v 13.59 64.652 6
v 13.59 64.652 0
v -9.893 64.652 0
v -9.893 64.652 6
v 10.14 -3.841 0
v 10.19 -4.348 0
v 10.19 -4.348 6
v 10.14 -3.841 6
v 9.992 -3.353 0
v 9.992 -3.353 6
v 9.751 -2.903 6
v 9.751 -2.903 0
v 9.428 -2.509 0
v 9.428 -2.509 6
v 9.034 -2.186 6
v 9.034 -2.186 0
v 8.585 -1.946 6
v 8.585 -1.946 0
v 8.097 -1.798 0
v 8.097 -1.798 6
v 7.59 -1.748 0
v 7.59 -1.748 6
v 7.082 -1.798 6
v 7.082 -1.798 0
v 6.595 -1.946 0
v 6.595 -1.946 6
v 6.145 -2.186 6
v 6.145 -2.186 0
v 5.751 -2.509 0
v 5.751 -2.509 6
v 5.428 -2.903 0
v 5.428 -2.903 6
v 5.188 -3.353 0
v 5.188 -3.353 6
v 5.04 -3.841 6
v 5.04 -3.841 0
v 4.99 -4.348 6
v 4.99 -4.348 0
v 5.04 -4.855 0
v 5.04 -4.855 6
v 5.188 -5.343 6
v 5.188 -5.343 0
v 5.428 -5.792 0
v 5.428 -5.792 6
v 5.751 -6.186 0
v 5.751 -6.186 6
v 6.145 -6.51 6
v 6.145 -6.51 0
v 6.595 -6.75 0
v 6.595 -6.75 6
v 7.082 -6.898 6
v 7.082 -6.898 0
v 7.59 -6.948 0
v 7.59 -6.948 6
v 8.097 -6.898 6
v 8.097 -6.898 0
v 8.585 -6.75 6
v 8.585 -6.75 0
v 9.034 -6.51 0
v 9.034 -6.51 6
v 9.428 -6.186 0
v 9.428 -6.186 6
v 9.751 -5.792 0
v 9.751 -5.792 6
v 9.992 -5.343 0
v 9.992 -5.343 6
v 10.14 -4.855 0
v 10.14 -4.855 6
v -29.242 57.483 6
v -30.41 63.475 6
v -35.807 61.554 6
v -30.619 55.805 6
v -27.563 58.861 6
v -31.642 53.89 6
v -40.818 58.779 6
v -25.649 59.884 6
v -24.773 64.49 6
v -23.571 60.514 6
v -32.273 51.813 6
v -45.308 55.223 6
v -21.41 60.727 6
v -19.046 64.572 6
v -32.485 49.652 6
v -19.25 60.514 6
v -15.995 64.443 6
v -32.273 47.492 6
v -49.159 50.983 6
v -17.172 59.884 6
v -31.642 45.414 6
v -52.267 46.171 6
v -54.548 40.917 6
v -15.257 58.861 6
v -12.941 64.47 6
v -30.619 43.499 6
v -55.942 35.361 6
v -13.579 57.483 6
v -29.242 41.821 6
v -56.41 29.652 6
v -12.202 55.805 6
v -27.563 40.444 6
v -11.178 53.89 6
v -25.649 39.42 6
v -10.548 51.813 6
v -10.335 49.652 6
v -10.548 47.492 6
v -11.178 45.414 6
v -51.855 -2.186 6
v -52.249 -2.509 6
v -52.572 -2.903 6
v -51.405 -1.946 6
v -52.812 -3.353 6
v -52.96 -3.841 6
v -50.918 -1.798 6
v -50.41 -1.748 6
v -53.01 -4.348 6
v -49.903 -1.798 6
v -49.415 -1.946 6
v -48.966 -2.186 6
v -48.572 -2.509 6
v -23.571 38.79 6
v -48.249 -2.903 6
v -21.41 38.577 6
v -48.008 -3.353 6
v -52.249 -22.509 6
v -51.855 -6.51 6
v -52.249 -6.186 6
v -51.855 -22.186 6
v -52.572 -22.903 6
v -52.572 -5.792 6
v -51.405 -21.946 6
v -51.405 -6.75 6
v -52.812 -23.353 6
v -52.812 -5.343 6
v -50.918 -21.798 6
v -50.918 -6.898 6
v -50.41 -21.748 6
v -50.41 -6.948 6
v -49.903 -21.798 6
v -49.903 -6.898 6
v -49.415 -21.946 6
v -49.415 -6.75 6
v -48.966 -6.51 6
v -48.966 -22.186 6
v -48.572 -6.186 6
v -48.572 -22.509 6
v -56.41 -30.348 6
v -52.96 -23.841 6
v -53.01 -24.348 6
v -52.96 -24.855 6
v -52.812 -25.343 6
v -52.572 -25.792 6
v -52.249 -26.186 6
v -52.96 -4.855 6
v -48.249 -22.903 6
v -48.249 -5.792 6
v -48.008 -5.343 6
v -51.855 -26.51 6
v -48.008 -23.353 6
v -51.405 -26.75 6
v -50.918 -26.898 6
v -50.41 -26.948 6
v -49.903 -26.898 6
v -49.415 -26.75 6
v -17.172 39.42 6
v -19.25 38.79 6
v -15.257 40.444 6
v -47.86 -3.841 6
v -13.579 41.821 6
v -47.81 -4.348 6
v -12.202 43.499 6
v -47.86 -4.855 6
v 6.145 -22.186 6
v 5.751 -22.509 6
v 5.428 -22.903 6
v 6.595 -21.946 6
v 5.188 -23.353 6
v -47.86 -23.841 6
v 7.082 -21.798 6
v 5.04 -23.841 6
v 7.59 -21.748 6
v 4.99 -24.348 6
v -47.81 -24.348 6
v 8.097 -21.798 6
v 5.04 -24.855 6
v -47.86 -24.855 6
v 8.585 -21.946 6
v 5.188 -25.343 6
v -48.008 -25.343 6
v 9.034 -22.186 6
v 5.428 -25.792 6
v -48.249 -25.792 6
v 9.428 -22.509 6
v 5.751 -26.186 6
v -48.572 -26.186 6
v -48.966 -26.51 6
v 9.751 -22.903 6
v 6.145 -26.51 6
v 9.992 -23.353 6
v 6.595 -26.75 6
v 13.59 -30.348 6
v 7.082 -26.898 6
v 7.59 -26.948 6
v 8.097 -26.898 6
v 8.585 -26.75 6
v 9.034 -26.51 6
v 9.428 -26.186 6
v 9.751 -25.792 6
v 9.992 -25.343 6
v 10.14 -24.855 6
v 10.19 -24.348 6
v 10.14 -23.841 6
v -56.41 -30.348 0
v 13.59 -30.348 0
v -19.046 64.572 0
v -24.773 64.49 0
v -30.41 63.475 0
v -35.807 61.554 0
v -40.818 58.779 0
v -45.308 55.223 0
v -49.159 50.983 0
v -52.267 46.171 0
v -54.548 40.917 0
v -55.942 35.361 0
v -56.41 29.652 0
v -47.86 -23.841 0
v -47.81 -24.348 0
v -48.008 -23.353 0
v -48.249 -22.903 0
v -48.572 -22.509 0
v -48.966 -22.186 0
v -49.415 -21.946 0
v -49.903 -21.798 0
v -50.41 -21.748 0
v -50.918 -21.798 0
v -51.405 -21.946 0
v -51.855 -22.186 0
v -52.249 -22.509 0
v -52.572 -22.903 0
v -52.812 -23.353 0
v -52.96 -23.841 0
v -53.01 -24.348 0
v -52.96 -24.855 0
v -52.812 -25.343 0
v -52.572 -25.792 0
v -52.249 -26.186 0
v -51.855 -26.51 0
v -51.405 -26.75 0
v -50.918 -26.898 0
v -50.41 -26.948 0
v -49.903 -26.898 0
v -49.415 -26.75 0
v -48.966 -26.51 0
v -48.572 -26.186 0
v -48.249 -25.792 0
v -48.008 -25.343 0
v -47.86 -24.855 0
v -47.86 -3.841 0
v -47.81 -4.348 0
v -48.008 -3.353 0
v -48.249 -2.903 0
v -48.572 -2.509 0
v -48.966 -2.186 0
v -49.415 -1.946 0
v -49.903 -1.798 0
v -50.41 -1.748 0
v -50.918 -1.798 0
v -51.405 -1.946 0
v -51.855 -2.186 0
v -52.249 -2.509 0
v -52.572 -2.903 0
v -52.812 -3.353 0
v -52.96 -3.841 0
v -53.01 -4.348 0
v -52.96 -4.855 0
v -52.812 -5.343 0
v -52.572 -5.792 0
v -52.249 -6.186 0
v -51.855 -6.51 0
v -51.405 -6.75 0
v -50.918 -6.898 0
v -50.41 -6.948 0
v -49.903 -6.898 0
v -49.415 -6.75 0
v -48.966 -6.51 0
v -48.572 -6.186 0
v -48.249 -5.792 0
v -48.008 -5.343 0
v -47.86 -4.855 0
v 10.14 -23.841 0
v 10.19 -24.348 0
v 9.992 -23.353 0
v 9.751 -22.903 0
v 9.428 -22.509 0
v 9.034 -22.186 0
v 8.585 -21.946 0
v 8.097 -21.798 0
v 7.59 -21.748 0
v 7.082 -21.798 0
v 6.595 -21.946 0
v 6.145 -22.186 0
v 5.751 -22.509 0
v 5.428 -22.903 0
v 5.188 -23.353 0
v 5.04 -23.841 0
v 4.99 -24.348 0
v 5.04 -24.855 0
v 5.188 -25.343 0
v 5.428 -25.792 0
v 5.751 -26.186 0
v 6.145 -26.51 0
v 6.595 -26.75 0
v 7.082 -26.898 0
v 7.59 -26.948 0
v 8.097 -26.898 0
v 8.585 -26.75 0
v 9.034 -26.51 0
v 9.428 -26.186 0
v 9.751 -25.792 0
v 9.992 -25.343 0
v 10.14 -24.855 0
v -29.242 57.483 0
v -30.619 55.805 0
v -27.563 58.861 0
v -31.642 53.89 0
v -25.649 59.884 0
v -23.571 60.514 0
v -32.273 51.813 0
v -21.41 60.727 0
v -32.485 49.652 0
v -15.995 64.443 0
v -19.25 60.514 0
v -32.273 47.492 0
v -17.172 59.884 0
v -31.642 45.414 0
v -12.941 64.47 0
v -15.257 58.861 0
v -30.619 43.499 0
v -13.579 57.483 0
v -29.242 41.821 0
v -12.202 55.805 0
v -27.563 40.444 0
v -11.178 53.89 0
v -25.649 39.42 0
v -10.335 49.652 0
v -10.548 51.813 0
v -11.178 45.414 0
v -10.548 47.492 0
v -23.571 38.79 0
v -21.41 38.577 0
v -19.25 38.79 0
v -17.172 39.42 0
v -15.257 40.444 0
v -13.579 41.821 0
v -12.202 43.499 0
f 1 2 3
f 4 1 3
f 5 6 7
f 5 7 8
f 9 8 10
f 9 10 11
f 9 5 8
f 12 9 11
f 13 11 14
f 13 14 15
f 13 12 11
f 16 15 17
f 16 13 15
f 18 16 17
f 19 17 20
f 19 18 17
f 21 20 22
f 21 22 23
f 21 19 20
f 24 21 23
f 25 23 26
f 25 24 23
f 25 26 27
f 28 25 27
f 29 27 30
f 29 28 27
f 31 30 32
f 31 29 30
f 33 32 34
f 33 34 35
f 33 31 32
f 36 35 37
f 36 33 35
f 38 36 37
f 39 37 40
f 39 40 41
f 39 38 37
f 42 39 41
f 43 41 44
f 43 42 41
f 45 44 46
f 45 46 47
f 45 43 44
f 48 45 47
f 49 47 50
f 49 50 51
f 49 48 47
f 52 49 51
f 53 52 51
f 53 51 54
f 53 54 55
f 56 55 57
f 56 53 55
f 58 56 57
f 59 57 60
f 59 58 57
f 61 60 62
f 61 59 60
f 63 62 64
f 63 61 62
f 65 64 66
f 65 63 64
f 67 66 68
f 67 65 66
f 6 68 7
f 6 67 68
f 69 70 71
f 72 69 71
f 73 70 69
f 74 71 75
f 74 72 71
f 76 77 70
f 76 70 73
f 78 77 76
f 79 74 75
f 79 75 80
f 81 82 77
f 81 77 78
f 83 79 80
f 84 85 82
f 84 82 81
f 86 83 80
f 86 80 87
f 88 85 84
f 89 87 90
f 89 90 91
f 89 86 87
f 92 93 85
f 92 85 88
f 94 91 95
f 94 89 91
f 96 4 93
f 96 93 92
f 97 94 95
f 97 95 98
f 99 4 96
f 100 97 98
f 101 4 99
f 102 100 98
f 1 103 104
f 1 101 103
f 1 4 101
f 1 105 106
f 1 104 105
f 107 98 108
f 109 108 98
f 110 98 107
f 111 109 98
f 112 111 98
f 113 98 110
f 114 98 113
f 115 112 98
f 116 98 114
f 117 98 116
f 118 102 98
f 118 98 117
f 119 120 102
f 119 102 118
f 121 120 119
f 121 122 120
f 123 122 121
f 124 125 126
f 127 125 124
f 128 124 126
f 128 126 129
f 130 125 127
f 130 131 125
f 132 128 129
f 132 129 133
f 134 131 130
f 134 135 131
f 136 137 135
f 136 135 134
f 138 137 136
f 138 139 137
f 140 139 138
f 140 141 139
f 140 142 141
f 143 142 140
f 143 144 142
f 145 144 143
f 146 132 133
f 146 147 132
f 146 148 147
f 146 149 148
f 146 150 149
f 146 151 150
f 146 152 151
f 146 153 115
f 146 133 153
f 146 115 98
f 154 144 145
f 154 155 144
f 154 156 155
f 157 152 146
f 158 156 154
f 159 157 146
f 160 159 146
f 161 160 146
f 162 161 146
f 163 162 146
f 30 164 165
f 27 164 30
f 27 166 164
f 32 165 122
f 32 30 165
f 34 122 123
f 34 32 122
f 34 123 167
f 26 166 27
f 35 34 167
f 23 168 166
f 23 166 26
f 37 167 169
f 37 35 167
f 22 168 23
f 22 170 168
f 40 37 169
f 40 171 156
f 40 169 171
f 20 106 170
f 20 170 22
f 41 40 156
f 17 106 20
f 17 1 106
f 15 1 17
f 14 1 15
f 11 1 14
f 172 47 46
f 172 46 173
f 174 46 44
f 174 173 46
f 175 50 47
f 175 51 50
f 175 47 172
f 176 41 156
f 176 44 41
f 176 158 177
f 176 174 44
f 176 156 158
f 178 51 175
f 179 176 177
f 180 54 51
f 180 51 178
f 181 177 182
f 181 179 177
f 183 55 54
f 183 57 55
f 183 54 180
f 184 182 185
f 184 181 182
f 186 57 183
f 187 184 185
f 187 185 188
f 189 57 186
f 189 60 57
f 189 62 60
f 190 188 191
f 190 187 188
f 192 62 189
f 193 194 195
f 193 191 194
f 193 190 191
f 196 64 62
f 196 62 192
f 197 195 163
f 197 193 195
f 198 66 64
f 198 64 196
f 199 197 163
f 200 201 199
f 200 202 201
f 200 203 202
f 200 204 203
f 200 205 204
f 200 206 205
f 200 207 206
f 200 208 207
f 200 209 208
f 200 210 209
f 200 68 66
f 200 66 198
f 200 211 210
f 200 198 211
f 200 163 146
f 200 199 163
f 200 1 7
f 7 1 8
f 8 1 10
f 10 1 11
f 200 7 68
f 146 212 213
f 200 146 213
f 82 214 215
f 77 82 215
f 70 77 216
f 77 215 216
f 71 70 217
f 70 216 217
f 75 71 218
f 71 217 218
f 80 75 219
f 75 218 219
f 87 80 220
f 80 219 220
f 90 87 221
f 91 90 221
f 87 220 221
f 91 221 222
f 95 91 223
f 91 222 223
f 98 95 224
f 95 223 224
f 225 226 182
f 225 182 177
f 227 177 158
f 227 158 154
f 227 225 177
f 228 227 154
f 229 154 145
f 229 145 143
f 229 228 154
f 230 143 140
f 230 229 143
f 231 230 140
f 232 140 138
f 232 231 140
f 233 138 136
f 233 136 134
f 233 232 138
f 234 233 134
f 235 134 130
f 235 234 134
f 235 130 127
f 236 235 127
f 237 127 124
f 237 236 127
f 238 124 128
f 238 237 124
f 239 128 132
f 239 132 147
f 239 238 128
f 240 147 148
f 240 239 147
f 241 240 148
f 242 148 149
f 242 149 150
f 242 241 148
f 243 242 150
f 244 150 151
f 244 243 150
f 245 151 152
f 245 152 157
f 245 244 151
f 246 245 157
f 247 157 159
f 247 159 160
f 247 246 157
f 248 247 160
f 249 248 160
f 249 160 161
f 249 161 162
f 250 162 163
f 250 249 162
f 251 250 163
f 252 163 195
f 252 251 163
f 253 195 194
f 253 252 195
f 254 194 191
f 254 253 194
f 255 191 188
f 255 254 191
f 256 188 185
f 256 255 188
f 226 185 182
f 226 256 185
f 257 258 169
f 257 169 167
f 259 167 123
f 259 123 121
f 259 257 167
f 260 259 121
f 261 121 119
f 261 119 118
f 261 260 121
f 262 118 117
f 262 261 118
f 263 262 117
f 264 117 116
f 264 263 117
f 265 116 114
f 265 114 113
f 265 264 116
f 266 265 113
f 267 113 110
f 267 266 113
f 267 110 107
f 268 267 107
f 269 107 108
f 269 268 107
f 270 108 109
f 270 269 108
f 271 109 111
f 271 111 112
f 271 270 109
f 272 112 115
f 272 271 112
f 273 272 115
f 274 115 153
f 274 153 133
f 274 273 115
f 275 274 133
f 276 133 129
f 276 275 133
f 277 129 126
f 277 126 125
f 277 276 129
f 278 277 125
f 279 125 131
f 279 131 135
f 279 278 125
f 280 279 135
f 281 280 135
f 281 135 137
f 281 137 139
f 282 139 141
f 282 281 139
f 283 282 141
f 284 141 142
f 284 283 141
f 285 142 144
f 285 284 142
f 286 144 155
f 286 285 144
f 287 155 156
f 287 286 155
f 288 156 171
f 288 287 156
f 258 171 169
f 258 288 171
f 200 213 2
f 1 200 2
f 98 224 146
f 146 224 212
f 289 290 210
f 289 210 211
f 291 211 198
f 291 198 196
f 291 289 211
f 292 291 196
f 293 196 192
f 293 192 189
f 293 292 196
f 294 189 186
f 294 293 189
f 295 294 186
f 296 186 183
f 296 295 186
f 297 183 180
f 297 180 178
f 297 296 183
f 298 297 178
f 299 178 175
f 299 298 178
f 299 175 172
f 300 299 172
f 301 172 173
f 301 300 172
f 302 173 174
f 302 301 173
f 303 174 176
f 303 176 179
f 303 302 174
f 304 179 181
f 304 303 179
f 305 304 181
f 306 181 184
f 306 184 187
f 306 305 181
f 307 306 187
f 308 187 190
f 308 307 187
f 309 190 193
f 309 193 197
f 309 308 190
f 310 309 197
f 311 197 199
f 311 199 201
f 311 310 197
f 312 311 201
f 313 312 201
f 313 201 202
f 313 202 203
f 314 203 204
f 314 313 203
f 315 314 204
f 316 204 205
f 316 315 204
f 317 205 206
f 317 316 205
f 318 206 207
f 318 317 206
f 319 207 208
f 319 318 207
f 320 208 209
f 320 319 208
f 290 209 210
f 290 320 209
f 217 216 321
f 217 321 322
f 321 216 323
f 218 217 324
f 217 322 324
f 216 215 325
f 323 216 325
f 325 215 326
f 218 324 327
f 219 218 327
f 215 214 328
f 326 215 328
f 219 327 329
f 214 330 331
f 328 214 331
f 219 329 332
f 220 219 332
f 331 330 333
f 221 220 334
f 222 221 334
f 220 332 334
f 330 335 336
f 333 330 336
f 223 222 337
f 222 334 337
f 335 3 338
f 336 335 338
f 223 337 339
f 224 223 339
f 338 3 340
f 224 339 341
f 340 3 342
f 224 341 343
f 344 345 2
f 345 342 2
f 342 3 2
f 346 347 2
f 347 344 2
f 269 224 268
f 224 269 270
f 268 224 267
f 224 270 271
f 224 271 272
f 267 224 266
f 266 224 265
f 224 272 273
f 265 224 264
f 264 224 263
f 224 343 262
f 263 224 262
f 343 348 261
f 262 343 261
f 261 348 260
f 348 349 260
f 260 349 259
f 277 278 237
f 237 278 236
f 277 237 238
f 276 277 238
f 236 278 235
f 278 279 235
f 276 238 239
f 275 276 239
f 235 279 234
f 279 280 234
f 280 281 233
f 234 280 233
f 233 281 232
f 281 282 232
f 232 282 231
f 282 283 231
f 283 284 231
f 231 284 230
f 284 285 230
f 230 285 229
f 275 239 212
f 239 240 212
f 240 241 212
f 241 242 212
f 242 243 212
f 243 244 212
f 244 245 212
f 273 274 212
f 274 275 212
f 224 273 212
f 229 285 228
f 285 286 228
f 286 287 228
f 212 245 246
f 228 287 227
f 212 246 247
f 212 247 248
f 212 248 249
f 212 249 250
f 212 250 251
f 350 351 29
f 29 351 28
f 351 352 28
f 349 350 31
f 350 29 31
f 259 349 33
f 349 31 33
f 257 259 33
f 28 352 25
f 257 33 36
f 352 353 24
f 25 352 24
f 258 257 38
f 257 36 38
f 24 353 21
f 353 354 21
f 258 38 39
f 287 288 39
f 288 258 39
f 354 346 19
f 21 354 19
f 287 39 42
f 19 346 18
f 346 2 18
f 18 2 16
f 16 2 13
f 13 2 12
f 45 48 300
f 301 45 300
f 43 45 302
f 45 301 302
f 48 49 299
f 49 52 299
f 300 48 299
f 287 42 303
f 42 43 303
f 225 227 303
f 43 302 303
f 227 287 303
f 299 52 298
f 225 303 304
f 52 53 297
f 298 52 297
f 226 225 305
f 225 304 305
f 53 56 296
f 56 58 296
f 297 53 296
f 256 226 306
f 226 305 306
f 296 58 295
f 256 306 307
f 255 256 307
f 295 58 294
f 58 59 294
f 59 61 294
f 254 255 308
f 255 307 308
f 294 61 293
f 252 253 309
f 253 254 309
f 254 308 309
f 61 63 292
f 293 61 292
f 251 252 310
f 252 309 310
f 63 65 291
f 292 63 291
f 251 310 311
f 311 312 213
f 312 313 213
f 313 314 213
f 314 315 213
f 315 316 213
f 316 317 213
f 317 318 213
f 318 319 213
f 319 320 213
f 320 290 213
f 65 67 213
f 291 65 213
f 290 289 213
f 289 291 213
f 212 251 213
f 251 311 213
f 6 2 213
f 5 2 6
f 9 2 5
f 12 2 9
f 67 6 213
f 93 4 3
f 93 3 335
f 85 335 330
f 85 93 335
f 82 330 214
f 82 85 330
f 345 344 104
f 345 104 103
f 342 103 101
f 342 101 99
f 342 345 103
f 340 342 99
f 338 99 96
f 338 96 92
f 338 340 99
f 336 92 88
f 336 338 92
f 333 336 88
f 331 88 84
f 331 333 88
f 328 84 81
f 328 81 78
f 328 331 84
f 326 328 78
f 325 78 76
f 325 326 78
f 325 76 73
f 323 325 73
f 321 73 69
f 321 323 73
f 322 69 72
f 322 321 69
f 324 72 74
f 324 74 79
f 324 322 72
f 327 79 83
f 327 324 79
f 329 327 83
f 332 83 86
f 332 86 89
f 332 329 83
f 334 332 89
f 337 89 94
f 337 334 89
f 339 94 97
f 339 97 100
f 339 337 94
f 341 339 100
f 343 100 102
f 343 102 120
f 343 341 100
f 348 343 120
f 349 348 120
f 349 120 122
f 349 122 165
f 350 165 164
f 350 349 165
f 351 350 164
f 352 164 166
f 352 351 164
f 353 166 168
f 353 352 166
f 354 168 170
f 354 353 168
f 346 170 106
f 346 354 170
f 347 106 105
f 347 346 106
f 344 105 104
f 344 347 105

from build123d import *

# Parameters (mm, degrees)
IZIM1_R                     = 11.075
IZIM1_R_2                   = 2.6
Y_KSEKLIK_EKSTR_ZYON1_DEPTH = 6
IZIM2_W                     = 40.176949225
IZIM2_H                     = 32.938980449
Y_KSEKLIK_EKSTR_ZYON2_DEPTH = 6
IZIM3_W                     = 23.482339904
IZIM3_H                     = 35
Y_KSEKLIK_EKSTR_ZYON3_DEPTH = 6
RADYUS1_R                   = 60


with BuildPart() as part:
    # Çizim1 → Yükseklik-Ekstrüzyon1 (new body)
    with BuildSketch(Plane.XY):
        with BuildLine():
            Line((-56.410377678, 29.652139902), (-56.410377678, -30.347860098))
            Line((-56.410377678, -30.347860098), (13.589622322, -30.347860098))
            Line((13.589622322, -30.347860098), (13.589622322, 29.652139902))
            ThreePointArc((13.589622322, 29.652139902), (-21.410377678, 64.652139902), (-56.410377678, 29.652139902))
        make_face()
        with Locations((-21.410377678, 49.652139902)):
            Circle(IZIM1_R, mode=Mode.SUBTRACT)
        with Locations((-50.410377678, -24.347860098)):
            Circle(IZIM1_R_2, mode=Mode.SUBTRACT)
        with Locations((7.589622322, -24.347860098)):
            Circle(IZIM1_R_2, mode=Mode.SUBTRACT)
        with Locations((-50.410377678, -4.347860098)):
            Circle(IZIM1_R_2, mode=Mode.SUBTRACT)
        with Locations((7.589622322, -4.347860098)):
            Circle(IZIM1_R_2, mode=Mode.SUBTRACT)
        with BuildLine():
            Line((-12.410377678, 4.652139902), (-12.410377678, -5.347860098))
            ThreePointArc((-12.410377678, -5.347860098), (-21.410377678, -14.347860098), (-30.410377678, -5.347860098))
            Line((-30.410377678, -5.347860098), (-30.410377678, 4.652139902))
            ThreePointArc((-30.410377678, 4.652139902), (-21.410377678, 13.652139902), (-12.410377678, 4.652139902))
        make_face(mode=Mode.SUBTRACT)
        with BuildLine():
            Line((-33.810377678, 4.652139902), (-33.810377678, -5.347860098))
            ThreePointArc((-33.810377678, -5.347860098), (-35.910377678, -7.447860098), (-38.010377678, -5.347860098))
            Line((-38.010377678, -5.347860098), (-38.010377678, 4.652139902))
            ThreePointArc((-38.010377678, 4.652139902), (-35.910377678, 6.752139902), (-33.810377678, 4.652139902))
        make_face(mode=Mode.SUBTRACT)
        with BuildLine():
            Line((-4.810377678, 4.652139902), (-4.810377678, -5.347860098))
            ThreePointArc((-4.810377678, -5.347860098), (-6.910377678, -7.447860098), (-9.010377678, -5.347860098))
            Line((-9.010377678, -5.347860098), (-9.010377678, 4.652139902))
            ThreePointArc((-9.010377678, 4.652139902), (-6.910377678, 6.752139902), (-4.810377678, 4.652139902))
        make_face(mode=Mode.SUBTRACT)
    extrude(amount=Y_KSEKLIK_EKSTR_ZYON1_DEPTH)

    # Çizim2 → Yükseklik-Ekstrüzyon2 (add)
    with BuildSketch(Plane(origin=(0, 0, 0), x_dir=(-1, 0, 0), z_dir=(0, 0, -1))):
        with Locations((20.088474613, 1.726881697)):
            Rectangle(IZIM2_W, IZIM2_H)
    extrude(amount=-Y_KSEKLIK_EKSTR_ZYON2_DEPTH)

    # Çizim3 → Yükseklik-Ekstrüzyon3 (add)
    with BuildSketch(Plane(origin=(0, 0, 0), x_dir=(-1, 0, 0), z_dir=(0, 0, -1))):
        with Locations((-1.84845237, 47.152139902)):
            Rectangle(IZIM3_W, IZIM3_H)
    extrude(amount=-Y_KSEKLIK_EKSTR_ZYON3_DEPTH)

    # Radyus1
    # the kernel refuses this fillet: 60 mm, written as the material it adds along each edge
    with BuildSketch(Plane(origin=(-9.892717582, 62.702760258, 6), x_dir=(0, 1, 0), z_dir=(0, 0, -1))) as radyus1_piece_1:
        with BuildLine():
            CenterArc((61.73230625, -5.099184882), RADYUS1_R, 175.124756337, 8.749263652)
            Line((1.869405236, -9.152958702), (0.672147215, -9.234034178))
            ThreePointArc((0.672147215, -9.234034178), (0.065725416, -4.753959725), (-1.133164126, -0.394891203))
            Line((-1.133164126, -0.394891203), (0, 1.2))
            ThreePointArc((0, 1.2), (0.974689822, 1.2), (0.753721112, 0.101983698))
            Line((0.753721112, 0.101983698), (1.949379644, 0))
        make_face()
    extrude(amount=6)


solid = part.part
